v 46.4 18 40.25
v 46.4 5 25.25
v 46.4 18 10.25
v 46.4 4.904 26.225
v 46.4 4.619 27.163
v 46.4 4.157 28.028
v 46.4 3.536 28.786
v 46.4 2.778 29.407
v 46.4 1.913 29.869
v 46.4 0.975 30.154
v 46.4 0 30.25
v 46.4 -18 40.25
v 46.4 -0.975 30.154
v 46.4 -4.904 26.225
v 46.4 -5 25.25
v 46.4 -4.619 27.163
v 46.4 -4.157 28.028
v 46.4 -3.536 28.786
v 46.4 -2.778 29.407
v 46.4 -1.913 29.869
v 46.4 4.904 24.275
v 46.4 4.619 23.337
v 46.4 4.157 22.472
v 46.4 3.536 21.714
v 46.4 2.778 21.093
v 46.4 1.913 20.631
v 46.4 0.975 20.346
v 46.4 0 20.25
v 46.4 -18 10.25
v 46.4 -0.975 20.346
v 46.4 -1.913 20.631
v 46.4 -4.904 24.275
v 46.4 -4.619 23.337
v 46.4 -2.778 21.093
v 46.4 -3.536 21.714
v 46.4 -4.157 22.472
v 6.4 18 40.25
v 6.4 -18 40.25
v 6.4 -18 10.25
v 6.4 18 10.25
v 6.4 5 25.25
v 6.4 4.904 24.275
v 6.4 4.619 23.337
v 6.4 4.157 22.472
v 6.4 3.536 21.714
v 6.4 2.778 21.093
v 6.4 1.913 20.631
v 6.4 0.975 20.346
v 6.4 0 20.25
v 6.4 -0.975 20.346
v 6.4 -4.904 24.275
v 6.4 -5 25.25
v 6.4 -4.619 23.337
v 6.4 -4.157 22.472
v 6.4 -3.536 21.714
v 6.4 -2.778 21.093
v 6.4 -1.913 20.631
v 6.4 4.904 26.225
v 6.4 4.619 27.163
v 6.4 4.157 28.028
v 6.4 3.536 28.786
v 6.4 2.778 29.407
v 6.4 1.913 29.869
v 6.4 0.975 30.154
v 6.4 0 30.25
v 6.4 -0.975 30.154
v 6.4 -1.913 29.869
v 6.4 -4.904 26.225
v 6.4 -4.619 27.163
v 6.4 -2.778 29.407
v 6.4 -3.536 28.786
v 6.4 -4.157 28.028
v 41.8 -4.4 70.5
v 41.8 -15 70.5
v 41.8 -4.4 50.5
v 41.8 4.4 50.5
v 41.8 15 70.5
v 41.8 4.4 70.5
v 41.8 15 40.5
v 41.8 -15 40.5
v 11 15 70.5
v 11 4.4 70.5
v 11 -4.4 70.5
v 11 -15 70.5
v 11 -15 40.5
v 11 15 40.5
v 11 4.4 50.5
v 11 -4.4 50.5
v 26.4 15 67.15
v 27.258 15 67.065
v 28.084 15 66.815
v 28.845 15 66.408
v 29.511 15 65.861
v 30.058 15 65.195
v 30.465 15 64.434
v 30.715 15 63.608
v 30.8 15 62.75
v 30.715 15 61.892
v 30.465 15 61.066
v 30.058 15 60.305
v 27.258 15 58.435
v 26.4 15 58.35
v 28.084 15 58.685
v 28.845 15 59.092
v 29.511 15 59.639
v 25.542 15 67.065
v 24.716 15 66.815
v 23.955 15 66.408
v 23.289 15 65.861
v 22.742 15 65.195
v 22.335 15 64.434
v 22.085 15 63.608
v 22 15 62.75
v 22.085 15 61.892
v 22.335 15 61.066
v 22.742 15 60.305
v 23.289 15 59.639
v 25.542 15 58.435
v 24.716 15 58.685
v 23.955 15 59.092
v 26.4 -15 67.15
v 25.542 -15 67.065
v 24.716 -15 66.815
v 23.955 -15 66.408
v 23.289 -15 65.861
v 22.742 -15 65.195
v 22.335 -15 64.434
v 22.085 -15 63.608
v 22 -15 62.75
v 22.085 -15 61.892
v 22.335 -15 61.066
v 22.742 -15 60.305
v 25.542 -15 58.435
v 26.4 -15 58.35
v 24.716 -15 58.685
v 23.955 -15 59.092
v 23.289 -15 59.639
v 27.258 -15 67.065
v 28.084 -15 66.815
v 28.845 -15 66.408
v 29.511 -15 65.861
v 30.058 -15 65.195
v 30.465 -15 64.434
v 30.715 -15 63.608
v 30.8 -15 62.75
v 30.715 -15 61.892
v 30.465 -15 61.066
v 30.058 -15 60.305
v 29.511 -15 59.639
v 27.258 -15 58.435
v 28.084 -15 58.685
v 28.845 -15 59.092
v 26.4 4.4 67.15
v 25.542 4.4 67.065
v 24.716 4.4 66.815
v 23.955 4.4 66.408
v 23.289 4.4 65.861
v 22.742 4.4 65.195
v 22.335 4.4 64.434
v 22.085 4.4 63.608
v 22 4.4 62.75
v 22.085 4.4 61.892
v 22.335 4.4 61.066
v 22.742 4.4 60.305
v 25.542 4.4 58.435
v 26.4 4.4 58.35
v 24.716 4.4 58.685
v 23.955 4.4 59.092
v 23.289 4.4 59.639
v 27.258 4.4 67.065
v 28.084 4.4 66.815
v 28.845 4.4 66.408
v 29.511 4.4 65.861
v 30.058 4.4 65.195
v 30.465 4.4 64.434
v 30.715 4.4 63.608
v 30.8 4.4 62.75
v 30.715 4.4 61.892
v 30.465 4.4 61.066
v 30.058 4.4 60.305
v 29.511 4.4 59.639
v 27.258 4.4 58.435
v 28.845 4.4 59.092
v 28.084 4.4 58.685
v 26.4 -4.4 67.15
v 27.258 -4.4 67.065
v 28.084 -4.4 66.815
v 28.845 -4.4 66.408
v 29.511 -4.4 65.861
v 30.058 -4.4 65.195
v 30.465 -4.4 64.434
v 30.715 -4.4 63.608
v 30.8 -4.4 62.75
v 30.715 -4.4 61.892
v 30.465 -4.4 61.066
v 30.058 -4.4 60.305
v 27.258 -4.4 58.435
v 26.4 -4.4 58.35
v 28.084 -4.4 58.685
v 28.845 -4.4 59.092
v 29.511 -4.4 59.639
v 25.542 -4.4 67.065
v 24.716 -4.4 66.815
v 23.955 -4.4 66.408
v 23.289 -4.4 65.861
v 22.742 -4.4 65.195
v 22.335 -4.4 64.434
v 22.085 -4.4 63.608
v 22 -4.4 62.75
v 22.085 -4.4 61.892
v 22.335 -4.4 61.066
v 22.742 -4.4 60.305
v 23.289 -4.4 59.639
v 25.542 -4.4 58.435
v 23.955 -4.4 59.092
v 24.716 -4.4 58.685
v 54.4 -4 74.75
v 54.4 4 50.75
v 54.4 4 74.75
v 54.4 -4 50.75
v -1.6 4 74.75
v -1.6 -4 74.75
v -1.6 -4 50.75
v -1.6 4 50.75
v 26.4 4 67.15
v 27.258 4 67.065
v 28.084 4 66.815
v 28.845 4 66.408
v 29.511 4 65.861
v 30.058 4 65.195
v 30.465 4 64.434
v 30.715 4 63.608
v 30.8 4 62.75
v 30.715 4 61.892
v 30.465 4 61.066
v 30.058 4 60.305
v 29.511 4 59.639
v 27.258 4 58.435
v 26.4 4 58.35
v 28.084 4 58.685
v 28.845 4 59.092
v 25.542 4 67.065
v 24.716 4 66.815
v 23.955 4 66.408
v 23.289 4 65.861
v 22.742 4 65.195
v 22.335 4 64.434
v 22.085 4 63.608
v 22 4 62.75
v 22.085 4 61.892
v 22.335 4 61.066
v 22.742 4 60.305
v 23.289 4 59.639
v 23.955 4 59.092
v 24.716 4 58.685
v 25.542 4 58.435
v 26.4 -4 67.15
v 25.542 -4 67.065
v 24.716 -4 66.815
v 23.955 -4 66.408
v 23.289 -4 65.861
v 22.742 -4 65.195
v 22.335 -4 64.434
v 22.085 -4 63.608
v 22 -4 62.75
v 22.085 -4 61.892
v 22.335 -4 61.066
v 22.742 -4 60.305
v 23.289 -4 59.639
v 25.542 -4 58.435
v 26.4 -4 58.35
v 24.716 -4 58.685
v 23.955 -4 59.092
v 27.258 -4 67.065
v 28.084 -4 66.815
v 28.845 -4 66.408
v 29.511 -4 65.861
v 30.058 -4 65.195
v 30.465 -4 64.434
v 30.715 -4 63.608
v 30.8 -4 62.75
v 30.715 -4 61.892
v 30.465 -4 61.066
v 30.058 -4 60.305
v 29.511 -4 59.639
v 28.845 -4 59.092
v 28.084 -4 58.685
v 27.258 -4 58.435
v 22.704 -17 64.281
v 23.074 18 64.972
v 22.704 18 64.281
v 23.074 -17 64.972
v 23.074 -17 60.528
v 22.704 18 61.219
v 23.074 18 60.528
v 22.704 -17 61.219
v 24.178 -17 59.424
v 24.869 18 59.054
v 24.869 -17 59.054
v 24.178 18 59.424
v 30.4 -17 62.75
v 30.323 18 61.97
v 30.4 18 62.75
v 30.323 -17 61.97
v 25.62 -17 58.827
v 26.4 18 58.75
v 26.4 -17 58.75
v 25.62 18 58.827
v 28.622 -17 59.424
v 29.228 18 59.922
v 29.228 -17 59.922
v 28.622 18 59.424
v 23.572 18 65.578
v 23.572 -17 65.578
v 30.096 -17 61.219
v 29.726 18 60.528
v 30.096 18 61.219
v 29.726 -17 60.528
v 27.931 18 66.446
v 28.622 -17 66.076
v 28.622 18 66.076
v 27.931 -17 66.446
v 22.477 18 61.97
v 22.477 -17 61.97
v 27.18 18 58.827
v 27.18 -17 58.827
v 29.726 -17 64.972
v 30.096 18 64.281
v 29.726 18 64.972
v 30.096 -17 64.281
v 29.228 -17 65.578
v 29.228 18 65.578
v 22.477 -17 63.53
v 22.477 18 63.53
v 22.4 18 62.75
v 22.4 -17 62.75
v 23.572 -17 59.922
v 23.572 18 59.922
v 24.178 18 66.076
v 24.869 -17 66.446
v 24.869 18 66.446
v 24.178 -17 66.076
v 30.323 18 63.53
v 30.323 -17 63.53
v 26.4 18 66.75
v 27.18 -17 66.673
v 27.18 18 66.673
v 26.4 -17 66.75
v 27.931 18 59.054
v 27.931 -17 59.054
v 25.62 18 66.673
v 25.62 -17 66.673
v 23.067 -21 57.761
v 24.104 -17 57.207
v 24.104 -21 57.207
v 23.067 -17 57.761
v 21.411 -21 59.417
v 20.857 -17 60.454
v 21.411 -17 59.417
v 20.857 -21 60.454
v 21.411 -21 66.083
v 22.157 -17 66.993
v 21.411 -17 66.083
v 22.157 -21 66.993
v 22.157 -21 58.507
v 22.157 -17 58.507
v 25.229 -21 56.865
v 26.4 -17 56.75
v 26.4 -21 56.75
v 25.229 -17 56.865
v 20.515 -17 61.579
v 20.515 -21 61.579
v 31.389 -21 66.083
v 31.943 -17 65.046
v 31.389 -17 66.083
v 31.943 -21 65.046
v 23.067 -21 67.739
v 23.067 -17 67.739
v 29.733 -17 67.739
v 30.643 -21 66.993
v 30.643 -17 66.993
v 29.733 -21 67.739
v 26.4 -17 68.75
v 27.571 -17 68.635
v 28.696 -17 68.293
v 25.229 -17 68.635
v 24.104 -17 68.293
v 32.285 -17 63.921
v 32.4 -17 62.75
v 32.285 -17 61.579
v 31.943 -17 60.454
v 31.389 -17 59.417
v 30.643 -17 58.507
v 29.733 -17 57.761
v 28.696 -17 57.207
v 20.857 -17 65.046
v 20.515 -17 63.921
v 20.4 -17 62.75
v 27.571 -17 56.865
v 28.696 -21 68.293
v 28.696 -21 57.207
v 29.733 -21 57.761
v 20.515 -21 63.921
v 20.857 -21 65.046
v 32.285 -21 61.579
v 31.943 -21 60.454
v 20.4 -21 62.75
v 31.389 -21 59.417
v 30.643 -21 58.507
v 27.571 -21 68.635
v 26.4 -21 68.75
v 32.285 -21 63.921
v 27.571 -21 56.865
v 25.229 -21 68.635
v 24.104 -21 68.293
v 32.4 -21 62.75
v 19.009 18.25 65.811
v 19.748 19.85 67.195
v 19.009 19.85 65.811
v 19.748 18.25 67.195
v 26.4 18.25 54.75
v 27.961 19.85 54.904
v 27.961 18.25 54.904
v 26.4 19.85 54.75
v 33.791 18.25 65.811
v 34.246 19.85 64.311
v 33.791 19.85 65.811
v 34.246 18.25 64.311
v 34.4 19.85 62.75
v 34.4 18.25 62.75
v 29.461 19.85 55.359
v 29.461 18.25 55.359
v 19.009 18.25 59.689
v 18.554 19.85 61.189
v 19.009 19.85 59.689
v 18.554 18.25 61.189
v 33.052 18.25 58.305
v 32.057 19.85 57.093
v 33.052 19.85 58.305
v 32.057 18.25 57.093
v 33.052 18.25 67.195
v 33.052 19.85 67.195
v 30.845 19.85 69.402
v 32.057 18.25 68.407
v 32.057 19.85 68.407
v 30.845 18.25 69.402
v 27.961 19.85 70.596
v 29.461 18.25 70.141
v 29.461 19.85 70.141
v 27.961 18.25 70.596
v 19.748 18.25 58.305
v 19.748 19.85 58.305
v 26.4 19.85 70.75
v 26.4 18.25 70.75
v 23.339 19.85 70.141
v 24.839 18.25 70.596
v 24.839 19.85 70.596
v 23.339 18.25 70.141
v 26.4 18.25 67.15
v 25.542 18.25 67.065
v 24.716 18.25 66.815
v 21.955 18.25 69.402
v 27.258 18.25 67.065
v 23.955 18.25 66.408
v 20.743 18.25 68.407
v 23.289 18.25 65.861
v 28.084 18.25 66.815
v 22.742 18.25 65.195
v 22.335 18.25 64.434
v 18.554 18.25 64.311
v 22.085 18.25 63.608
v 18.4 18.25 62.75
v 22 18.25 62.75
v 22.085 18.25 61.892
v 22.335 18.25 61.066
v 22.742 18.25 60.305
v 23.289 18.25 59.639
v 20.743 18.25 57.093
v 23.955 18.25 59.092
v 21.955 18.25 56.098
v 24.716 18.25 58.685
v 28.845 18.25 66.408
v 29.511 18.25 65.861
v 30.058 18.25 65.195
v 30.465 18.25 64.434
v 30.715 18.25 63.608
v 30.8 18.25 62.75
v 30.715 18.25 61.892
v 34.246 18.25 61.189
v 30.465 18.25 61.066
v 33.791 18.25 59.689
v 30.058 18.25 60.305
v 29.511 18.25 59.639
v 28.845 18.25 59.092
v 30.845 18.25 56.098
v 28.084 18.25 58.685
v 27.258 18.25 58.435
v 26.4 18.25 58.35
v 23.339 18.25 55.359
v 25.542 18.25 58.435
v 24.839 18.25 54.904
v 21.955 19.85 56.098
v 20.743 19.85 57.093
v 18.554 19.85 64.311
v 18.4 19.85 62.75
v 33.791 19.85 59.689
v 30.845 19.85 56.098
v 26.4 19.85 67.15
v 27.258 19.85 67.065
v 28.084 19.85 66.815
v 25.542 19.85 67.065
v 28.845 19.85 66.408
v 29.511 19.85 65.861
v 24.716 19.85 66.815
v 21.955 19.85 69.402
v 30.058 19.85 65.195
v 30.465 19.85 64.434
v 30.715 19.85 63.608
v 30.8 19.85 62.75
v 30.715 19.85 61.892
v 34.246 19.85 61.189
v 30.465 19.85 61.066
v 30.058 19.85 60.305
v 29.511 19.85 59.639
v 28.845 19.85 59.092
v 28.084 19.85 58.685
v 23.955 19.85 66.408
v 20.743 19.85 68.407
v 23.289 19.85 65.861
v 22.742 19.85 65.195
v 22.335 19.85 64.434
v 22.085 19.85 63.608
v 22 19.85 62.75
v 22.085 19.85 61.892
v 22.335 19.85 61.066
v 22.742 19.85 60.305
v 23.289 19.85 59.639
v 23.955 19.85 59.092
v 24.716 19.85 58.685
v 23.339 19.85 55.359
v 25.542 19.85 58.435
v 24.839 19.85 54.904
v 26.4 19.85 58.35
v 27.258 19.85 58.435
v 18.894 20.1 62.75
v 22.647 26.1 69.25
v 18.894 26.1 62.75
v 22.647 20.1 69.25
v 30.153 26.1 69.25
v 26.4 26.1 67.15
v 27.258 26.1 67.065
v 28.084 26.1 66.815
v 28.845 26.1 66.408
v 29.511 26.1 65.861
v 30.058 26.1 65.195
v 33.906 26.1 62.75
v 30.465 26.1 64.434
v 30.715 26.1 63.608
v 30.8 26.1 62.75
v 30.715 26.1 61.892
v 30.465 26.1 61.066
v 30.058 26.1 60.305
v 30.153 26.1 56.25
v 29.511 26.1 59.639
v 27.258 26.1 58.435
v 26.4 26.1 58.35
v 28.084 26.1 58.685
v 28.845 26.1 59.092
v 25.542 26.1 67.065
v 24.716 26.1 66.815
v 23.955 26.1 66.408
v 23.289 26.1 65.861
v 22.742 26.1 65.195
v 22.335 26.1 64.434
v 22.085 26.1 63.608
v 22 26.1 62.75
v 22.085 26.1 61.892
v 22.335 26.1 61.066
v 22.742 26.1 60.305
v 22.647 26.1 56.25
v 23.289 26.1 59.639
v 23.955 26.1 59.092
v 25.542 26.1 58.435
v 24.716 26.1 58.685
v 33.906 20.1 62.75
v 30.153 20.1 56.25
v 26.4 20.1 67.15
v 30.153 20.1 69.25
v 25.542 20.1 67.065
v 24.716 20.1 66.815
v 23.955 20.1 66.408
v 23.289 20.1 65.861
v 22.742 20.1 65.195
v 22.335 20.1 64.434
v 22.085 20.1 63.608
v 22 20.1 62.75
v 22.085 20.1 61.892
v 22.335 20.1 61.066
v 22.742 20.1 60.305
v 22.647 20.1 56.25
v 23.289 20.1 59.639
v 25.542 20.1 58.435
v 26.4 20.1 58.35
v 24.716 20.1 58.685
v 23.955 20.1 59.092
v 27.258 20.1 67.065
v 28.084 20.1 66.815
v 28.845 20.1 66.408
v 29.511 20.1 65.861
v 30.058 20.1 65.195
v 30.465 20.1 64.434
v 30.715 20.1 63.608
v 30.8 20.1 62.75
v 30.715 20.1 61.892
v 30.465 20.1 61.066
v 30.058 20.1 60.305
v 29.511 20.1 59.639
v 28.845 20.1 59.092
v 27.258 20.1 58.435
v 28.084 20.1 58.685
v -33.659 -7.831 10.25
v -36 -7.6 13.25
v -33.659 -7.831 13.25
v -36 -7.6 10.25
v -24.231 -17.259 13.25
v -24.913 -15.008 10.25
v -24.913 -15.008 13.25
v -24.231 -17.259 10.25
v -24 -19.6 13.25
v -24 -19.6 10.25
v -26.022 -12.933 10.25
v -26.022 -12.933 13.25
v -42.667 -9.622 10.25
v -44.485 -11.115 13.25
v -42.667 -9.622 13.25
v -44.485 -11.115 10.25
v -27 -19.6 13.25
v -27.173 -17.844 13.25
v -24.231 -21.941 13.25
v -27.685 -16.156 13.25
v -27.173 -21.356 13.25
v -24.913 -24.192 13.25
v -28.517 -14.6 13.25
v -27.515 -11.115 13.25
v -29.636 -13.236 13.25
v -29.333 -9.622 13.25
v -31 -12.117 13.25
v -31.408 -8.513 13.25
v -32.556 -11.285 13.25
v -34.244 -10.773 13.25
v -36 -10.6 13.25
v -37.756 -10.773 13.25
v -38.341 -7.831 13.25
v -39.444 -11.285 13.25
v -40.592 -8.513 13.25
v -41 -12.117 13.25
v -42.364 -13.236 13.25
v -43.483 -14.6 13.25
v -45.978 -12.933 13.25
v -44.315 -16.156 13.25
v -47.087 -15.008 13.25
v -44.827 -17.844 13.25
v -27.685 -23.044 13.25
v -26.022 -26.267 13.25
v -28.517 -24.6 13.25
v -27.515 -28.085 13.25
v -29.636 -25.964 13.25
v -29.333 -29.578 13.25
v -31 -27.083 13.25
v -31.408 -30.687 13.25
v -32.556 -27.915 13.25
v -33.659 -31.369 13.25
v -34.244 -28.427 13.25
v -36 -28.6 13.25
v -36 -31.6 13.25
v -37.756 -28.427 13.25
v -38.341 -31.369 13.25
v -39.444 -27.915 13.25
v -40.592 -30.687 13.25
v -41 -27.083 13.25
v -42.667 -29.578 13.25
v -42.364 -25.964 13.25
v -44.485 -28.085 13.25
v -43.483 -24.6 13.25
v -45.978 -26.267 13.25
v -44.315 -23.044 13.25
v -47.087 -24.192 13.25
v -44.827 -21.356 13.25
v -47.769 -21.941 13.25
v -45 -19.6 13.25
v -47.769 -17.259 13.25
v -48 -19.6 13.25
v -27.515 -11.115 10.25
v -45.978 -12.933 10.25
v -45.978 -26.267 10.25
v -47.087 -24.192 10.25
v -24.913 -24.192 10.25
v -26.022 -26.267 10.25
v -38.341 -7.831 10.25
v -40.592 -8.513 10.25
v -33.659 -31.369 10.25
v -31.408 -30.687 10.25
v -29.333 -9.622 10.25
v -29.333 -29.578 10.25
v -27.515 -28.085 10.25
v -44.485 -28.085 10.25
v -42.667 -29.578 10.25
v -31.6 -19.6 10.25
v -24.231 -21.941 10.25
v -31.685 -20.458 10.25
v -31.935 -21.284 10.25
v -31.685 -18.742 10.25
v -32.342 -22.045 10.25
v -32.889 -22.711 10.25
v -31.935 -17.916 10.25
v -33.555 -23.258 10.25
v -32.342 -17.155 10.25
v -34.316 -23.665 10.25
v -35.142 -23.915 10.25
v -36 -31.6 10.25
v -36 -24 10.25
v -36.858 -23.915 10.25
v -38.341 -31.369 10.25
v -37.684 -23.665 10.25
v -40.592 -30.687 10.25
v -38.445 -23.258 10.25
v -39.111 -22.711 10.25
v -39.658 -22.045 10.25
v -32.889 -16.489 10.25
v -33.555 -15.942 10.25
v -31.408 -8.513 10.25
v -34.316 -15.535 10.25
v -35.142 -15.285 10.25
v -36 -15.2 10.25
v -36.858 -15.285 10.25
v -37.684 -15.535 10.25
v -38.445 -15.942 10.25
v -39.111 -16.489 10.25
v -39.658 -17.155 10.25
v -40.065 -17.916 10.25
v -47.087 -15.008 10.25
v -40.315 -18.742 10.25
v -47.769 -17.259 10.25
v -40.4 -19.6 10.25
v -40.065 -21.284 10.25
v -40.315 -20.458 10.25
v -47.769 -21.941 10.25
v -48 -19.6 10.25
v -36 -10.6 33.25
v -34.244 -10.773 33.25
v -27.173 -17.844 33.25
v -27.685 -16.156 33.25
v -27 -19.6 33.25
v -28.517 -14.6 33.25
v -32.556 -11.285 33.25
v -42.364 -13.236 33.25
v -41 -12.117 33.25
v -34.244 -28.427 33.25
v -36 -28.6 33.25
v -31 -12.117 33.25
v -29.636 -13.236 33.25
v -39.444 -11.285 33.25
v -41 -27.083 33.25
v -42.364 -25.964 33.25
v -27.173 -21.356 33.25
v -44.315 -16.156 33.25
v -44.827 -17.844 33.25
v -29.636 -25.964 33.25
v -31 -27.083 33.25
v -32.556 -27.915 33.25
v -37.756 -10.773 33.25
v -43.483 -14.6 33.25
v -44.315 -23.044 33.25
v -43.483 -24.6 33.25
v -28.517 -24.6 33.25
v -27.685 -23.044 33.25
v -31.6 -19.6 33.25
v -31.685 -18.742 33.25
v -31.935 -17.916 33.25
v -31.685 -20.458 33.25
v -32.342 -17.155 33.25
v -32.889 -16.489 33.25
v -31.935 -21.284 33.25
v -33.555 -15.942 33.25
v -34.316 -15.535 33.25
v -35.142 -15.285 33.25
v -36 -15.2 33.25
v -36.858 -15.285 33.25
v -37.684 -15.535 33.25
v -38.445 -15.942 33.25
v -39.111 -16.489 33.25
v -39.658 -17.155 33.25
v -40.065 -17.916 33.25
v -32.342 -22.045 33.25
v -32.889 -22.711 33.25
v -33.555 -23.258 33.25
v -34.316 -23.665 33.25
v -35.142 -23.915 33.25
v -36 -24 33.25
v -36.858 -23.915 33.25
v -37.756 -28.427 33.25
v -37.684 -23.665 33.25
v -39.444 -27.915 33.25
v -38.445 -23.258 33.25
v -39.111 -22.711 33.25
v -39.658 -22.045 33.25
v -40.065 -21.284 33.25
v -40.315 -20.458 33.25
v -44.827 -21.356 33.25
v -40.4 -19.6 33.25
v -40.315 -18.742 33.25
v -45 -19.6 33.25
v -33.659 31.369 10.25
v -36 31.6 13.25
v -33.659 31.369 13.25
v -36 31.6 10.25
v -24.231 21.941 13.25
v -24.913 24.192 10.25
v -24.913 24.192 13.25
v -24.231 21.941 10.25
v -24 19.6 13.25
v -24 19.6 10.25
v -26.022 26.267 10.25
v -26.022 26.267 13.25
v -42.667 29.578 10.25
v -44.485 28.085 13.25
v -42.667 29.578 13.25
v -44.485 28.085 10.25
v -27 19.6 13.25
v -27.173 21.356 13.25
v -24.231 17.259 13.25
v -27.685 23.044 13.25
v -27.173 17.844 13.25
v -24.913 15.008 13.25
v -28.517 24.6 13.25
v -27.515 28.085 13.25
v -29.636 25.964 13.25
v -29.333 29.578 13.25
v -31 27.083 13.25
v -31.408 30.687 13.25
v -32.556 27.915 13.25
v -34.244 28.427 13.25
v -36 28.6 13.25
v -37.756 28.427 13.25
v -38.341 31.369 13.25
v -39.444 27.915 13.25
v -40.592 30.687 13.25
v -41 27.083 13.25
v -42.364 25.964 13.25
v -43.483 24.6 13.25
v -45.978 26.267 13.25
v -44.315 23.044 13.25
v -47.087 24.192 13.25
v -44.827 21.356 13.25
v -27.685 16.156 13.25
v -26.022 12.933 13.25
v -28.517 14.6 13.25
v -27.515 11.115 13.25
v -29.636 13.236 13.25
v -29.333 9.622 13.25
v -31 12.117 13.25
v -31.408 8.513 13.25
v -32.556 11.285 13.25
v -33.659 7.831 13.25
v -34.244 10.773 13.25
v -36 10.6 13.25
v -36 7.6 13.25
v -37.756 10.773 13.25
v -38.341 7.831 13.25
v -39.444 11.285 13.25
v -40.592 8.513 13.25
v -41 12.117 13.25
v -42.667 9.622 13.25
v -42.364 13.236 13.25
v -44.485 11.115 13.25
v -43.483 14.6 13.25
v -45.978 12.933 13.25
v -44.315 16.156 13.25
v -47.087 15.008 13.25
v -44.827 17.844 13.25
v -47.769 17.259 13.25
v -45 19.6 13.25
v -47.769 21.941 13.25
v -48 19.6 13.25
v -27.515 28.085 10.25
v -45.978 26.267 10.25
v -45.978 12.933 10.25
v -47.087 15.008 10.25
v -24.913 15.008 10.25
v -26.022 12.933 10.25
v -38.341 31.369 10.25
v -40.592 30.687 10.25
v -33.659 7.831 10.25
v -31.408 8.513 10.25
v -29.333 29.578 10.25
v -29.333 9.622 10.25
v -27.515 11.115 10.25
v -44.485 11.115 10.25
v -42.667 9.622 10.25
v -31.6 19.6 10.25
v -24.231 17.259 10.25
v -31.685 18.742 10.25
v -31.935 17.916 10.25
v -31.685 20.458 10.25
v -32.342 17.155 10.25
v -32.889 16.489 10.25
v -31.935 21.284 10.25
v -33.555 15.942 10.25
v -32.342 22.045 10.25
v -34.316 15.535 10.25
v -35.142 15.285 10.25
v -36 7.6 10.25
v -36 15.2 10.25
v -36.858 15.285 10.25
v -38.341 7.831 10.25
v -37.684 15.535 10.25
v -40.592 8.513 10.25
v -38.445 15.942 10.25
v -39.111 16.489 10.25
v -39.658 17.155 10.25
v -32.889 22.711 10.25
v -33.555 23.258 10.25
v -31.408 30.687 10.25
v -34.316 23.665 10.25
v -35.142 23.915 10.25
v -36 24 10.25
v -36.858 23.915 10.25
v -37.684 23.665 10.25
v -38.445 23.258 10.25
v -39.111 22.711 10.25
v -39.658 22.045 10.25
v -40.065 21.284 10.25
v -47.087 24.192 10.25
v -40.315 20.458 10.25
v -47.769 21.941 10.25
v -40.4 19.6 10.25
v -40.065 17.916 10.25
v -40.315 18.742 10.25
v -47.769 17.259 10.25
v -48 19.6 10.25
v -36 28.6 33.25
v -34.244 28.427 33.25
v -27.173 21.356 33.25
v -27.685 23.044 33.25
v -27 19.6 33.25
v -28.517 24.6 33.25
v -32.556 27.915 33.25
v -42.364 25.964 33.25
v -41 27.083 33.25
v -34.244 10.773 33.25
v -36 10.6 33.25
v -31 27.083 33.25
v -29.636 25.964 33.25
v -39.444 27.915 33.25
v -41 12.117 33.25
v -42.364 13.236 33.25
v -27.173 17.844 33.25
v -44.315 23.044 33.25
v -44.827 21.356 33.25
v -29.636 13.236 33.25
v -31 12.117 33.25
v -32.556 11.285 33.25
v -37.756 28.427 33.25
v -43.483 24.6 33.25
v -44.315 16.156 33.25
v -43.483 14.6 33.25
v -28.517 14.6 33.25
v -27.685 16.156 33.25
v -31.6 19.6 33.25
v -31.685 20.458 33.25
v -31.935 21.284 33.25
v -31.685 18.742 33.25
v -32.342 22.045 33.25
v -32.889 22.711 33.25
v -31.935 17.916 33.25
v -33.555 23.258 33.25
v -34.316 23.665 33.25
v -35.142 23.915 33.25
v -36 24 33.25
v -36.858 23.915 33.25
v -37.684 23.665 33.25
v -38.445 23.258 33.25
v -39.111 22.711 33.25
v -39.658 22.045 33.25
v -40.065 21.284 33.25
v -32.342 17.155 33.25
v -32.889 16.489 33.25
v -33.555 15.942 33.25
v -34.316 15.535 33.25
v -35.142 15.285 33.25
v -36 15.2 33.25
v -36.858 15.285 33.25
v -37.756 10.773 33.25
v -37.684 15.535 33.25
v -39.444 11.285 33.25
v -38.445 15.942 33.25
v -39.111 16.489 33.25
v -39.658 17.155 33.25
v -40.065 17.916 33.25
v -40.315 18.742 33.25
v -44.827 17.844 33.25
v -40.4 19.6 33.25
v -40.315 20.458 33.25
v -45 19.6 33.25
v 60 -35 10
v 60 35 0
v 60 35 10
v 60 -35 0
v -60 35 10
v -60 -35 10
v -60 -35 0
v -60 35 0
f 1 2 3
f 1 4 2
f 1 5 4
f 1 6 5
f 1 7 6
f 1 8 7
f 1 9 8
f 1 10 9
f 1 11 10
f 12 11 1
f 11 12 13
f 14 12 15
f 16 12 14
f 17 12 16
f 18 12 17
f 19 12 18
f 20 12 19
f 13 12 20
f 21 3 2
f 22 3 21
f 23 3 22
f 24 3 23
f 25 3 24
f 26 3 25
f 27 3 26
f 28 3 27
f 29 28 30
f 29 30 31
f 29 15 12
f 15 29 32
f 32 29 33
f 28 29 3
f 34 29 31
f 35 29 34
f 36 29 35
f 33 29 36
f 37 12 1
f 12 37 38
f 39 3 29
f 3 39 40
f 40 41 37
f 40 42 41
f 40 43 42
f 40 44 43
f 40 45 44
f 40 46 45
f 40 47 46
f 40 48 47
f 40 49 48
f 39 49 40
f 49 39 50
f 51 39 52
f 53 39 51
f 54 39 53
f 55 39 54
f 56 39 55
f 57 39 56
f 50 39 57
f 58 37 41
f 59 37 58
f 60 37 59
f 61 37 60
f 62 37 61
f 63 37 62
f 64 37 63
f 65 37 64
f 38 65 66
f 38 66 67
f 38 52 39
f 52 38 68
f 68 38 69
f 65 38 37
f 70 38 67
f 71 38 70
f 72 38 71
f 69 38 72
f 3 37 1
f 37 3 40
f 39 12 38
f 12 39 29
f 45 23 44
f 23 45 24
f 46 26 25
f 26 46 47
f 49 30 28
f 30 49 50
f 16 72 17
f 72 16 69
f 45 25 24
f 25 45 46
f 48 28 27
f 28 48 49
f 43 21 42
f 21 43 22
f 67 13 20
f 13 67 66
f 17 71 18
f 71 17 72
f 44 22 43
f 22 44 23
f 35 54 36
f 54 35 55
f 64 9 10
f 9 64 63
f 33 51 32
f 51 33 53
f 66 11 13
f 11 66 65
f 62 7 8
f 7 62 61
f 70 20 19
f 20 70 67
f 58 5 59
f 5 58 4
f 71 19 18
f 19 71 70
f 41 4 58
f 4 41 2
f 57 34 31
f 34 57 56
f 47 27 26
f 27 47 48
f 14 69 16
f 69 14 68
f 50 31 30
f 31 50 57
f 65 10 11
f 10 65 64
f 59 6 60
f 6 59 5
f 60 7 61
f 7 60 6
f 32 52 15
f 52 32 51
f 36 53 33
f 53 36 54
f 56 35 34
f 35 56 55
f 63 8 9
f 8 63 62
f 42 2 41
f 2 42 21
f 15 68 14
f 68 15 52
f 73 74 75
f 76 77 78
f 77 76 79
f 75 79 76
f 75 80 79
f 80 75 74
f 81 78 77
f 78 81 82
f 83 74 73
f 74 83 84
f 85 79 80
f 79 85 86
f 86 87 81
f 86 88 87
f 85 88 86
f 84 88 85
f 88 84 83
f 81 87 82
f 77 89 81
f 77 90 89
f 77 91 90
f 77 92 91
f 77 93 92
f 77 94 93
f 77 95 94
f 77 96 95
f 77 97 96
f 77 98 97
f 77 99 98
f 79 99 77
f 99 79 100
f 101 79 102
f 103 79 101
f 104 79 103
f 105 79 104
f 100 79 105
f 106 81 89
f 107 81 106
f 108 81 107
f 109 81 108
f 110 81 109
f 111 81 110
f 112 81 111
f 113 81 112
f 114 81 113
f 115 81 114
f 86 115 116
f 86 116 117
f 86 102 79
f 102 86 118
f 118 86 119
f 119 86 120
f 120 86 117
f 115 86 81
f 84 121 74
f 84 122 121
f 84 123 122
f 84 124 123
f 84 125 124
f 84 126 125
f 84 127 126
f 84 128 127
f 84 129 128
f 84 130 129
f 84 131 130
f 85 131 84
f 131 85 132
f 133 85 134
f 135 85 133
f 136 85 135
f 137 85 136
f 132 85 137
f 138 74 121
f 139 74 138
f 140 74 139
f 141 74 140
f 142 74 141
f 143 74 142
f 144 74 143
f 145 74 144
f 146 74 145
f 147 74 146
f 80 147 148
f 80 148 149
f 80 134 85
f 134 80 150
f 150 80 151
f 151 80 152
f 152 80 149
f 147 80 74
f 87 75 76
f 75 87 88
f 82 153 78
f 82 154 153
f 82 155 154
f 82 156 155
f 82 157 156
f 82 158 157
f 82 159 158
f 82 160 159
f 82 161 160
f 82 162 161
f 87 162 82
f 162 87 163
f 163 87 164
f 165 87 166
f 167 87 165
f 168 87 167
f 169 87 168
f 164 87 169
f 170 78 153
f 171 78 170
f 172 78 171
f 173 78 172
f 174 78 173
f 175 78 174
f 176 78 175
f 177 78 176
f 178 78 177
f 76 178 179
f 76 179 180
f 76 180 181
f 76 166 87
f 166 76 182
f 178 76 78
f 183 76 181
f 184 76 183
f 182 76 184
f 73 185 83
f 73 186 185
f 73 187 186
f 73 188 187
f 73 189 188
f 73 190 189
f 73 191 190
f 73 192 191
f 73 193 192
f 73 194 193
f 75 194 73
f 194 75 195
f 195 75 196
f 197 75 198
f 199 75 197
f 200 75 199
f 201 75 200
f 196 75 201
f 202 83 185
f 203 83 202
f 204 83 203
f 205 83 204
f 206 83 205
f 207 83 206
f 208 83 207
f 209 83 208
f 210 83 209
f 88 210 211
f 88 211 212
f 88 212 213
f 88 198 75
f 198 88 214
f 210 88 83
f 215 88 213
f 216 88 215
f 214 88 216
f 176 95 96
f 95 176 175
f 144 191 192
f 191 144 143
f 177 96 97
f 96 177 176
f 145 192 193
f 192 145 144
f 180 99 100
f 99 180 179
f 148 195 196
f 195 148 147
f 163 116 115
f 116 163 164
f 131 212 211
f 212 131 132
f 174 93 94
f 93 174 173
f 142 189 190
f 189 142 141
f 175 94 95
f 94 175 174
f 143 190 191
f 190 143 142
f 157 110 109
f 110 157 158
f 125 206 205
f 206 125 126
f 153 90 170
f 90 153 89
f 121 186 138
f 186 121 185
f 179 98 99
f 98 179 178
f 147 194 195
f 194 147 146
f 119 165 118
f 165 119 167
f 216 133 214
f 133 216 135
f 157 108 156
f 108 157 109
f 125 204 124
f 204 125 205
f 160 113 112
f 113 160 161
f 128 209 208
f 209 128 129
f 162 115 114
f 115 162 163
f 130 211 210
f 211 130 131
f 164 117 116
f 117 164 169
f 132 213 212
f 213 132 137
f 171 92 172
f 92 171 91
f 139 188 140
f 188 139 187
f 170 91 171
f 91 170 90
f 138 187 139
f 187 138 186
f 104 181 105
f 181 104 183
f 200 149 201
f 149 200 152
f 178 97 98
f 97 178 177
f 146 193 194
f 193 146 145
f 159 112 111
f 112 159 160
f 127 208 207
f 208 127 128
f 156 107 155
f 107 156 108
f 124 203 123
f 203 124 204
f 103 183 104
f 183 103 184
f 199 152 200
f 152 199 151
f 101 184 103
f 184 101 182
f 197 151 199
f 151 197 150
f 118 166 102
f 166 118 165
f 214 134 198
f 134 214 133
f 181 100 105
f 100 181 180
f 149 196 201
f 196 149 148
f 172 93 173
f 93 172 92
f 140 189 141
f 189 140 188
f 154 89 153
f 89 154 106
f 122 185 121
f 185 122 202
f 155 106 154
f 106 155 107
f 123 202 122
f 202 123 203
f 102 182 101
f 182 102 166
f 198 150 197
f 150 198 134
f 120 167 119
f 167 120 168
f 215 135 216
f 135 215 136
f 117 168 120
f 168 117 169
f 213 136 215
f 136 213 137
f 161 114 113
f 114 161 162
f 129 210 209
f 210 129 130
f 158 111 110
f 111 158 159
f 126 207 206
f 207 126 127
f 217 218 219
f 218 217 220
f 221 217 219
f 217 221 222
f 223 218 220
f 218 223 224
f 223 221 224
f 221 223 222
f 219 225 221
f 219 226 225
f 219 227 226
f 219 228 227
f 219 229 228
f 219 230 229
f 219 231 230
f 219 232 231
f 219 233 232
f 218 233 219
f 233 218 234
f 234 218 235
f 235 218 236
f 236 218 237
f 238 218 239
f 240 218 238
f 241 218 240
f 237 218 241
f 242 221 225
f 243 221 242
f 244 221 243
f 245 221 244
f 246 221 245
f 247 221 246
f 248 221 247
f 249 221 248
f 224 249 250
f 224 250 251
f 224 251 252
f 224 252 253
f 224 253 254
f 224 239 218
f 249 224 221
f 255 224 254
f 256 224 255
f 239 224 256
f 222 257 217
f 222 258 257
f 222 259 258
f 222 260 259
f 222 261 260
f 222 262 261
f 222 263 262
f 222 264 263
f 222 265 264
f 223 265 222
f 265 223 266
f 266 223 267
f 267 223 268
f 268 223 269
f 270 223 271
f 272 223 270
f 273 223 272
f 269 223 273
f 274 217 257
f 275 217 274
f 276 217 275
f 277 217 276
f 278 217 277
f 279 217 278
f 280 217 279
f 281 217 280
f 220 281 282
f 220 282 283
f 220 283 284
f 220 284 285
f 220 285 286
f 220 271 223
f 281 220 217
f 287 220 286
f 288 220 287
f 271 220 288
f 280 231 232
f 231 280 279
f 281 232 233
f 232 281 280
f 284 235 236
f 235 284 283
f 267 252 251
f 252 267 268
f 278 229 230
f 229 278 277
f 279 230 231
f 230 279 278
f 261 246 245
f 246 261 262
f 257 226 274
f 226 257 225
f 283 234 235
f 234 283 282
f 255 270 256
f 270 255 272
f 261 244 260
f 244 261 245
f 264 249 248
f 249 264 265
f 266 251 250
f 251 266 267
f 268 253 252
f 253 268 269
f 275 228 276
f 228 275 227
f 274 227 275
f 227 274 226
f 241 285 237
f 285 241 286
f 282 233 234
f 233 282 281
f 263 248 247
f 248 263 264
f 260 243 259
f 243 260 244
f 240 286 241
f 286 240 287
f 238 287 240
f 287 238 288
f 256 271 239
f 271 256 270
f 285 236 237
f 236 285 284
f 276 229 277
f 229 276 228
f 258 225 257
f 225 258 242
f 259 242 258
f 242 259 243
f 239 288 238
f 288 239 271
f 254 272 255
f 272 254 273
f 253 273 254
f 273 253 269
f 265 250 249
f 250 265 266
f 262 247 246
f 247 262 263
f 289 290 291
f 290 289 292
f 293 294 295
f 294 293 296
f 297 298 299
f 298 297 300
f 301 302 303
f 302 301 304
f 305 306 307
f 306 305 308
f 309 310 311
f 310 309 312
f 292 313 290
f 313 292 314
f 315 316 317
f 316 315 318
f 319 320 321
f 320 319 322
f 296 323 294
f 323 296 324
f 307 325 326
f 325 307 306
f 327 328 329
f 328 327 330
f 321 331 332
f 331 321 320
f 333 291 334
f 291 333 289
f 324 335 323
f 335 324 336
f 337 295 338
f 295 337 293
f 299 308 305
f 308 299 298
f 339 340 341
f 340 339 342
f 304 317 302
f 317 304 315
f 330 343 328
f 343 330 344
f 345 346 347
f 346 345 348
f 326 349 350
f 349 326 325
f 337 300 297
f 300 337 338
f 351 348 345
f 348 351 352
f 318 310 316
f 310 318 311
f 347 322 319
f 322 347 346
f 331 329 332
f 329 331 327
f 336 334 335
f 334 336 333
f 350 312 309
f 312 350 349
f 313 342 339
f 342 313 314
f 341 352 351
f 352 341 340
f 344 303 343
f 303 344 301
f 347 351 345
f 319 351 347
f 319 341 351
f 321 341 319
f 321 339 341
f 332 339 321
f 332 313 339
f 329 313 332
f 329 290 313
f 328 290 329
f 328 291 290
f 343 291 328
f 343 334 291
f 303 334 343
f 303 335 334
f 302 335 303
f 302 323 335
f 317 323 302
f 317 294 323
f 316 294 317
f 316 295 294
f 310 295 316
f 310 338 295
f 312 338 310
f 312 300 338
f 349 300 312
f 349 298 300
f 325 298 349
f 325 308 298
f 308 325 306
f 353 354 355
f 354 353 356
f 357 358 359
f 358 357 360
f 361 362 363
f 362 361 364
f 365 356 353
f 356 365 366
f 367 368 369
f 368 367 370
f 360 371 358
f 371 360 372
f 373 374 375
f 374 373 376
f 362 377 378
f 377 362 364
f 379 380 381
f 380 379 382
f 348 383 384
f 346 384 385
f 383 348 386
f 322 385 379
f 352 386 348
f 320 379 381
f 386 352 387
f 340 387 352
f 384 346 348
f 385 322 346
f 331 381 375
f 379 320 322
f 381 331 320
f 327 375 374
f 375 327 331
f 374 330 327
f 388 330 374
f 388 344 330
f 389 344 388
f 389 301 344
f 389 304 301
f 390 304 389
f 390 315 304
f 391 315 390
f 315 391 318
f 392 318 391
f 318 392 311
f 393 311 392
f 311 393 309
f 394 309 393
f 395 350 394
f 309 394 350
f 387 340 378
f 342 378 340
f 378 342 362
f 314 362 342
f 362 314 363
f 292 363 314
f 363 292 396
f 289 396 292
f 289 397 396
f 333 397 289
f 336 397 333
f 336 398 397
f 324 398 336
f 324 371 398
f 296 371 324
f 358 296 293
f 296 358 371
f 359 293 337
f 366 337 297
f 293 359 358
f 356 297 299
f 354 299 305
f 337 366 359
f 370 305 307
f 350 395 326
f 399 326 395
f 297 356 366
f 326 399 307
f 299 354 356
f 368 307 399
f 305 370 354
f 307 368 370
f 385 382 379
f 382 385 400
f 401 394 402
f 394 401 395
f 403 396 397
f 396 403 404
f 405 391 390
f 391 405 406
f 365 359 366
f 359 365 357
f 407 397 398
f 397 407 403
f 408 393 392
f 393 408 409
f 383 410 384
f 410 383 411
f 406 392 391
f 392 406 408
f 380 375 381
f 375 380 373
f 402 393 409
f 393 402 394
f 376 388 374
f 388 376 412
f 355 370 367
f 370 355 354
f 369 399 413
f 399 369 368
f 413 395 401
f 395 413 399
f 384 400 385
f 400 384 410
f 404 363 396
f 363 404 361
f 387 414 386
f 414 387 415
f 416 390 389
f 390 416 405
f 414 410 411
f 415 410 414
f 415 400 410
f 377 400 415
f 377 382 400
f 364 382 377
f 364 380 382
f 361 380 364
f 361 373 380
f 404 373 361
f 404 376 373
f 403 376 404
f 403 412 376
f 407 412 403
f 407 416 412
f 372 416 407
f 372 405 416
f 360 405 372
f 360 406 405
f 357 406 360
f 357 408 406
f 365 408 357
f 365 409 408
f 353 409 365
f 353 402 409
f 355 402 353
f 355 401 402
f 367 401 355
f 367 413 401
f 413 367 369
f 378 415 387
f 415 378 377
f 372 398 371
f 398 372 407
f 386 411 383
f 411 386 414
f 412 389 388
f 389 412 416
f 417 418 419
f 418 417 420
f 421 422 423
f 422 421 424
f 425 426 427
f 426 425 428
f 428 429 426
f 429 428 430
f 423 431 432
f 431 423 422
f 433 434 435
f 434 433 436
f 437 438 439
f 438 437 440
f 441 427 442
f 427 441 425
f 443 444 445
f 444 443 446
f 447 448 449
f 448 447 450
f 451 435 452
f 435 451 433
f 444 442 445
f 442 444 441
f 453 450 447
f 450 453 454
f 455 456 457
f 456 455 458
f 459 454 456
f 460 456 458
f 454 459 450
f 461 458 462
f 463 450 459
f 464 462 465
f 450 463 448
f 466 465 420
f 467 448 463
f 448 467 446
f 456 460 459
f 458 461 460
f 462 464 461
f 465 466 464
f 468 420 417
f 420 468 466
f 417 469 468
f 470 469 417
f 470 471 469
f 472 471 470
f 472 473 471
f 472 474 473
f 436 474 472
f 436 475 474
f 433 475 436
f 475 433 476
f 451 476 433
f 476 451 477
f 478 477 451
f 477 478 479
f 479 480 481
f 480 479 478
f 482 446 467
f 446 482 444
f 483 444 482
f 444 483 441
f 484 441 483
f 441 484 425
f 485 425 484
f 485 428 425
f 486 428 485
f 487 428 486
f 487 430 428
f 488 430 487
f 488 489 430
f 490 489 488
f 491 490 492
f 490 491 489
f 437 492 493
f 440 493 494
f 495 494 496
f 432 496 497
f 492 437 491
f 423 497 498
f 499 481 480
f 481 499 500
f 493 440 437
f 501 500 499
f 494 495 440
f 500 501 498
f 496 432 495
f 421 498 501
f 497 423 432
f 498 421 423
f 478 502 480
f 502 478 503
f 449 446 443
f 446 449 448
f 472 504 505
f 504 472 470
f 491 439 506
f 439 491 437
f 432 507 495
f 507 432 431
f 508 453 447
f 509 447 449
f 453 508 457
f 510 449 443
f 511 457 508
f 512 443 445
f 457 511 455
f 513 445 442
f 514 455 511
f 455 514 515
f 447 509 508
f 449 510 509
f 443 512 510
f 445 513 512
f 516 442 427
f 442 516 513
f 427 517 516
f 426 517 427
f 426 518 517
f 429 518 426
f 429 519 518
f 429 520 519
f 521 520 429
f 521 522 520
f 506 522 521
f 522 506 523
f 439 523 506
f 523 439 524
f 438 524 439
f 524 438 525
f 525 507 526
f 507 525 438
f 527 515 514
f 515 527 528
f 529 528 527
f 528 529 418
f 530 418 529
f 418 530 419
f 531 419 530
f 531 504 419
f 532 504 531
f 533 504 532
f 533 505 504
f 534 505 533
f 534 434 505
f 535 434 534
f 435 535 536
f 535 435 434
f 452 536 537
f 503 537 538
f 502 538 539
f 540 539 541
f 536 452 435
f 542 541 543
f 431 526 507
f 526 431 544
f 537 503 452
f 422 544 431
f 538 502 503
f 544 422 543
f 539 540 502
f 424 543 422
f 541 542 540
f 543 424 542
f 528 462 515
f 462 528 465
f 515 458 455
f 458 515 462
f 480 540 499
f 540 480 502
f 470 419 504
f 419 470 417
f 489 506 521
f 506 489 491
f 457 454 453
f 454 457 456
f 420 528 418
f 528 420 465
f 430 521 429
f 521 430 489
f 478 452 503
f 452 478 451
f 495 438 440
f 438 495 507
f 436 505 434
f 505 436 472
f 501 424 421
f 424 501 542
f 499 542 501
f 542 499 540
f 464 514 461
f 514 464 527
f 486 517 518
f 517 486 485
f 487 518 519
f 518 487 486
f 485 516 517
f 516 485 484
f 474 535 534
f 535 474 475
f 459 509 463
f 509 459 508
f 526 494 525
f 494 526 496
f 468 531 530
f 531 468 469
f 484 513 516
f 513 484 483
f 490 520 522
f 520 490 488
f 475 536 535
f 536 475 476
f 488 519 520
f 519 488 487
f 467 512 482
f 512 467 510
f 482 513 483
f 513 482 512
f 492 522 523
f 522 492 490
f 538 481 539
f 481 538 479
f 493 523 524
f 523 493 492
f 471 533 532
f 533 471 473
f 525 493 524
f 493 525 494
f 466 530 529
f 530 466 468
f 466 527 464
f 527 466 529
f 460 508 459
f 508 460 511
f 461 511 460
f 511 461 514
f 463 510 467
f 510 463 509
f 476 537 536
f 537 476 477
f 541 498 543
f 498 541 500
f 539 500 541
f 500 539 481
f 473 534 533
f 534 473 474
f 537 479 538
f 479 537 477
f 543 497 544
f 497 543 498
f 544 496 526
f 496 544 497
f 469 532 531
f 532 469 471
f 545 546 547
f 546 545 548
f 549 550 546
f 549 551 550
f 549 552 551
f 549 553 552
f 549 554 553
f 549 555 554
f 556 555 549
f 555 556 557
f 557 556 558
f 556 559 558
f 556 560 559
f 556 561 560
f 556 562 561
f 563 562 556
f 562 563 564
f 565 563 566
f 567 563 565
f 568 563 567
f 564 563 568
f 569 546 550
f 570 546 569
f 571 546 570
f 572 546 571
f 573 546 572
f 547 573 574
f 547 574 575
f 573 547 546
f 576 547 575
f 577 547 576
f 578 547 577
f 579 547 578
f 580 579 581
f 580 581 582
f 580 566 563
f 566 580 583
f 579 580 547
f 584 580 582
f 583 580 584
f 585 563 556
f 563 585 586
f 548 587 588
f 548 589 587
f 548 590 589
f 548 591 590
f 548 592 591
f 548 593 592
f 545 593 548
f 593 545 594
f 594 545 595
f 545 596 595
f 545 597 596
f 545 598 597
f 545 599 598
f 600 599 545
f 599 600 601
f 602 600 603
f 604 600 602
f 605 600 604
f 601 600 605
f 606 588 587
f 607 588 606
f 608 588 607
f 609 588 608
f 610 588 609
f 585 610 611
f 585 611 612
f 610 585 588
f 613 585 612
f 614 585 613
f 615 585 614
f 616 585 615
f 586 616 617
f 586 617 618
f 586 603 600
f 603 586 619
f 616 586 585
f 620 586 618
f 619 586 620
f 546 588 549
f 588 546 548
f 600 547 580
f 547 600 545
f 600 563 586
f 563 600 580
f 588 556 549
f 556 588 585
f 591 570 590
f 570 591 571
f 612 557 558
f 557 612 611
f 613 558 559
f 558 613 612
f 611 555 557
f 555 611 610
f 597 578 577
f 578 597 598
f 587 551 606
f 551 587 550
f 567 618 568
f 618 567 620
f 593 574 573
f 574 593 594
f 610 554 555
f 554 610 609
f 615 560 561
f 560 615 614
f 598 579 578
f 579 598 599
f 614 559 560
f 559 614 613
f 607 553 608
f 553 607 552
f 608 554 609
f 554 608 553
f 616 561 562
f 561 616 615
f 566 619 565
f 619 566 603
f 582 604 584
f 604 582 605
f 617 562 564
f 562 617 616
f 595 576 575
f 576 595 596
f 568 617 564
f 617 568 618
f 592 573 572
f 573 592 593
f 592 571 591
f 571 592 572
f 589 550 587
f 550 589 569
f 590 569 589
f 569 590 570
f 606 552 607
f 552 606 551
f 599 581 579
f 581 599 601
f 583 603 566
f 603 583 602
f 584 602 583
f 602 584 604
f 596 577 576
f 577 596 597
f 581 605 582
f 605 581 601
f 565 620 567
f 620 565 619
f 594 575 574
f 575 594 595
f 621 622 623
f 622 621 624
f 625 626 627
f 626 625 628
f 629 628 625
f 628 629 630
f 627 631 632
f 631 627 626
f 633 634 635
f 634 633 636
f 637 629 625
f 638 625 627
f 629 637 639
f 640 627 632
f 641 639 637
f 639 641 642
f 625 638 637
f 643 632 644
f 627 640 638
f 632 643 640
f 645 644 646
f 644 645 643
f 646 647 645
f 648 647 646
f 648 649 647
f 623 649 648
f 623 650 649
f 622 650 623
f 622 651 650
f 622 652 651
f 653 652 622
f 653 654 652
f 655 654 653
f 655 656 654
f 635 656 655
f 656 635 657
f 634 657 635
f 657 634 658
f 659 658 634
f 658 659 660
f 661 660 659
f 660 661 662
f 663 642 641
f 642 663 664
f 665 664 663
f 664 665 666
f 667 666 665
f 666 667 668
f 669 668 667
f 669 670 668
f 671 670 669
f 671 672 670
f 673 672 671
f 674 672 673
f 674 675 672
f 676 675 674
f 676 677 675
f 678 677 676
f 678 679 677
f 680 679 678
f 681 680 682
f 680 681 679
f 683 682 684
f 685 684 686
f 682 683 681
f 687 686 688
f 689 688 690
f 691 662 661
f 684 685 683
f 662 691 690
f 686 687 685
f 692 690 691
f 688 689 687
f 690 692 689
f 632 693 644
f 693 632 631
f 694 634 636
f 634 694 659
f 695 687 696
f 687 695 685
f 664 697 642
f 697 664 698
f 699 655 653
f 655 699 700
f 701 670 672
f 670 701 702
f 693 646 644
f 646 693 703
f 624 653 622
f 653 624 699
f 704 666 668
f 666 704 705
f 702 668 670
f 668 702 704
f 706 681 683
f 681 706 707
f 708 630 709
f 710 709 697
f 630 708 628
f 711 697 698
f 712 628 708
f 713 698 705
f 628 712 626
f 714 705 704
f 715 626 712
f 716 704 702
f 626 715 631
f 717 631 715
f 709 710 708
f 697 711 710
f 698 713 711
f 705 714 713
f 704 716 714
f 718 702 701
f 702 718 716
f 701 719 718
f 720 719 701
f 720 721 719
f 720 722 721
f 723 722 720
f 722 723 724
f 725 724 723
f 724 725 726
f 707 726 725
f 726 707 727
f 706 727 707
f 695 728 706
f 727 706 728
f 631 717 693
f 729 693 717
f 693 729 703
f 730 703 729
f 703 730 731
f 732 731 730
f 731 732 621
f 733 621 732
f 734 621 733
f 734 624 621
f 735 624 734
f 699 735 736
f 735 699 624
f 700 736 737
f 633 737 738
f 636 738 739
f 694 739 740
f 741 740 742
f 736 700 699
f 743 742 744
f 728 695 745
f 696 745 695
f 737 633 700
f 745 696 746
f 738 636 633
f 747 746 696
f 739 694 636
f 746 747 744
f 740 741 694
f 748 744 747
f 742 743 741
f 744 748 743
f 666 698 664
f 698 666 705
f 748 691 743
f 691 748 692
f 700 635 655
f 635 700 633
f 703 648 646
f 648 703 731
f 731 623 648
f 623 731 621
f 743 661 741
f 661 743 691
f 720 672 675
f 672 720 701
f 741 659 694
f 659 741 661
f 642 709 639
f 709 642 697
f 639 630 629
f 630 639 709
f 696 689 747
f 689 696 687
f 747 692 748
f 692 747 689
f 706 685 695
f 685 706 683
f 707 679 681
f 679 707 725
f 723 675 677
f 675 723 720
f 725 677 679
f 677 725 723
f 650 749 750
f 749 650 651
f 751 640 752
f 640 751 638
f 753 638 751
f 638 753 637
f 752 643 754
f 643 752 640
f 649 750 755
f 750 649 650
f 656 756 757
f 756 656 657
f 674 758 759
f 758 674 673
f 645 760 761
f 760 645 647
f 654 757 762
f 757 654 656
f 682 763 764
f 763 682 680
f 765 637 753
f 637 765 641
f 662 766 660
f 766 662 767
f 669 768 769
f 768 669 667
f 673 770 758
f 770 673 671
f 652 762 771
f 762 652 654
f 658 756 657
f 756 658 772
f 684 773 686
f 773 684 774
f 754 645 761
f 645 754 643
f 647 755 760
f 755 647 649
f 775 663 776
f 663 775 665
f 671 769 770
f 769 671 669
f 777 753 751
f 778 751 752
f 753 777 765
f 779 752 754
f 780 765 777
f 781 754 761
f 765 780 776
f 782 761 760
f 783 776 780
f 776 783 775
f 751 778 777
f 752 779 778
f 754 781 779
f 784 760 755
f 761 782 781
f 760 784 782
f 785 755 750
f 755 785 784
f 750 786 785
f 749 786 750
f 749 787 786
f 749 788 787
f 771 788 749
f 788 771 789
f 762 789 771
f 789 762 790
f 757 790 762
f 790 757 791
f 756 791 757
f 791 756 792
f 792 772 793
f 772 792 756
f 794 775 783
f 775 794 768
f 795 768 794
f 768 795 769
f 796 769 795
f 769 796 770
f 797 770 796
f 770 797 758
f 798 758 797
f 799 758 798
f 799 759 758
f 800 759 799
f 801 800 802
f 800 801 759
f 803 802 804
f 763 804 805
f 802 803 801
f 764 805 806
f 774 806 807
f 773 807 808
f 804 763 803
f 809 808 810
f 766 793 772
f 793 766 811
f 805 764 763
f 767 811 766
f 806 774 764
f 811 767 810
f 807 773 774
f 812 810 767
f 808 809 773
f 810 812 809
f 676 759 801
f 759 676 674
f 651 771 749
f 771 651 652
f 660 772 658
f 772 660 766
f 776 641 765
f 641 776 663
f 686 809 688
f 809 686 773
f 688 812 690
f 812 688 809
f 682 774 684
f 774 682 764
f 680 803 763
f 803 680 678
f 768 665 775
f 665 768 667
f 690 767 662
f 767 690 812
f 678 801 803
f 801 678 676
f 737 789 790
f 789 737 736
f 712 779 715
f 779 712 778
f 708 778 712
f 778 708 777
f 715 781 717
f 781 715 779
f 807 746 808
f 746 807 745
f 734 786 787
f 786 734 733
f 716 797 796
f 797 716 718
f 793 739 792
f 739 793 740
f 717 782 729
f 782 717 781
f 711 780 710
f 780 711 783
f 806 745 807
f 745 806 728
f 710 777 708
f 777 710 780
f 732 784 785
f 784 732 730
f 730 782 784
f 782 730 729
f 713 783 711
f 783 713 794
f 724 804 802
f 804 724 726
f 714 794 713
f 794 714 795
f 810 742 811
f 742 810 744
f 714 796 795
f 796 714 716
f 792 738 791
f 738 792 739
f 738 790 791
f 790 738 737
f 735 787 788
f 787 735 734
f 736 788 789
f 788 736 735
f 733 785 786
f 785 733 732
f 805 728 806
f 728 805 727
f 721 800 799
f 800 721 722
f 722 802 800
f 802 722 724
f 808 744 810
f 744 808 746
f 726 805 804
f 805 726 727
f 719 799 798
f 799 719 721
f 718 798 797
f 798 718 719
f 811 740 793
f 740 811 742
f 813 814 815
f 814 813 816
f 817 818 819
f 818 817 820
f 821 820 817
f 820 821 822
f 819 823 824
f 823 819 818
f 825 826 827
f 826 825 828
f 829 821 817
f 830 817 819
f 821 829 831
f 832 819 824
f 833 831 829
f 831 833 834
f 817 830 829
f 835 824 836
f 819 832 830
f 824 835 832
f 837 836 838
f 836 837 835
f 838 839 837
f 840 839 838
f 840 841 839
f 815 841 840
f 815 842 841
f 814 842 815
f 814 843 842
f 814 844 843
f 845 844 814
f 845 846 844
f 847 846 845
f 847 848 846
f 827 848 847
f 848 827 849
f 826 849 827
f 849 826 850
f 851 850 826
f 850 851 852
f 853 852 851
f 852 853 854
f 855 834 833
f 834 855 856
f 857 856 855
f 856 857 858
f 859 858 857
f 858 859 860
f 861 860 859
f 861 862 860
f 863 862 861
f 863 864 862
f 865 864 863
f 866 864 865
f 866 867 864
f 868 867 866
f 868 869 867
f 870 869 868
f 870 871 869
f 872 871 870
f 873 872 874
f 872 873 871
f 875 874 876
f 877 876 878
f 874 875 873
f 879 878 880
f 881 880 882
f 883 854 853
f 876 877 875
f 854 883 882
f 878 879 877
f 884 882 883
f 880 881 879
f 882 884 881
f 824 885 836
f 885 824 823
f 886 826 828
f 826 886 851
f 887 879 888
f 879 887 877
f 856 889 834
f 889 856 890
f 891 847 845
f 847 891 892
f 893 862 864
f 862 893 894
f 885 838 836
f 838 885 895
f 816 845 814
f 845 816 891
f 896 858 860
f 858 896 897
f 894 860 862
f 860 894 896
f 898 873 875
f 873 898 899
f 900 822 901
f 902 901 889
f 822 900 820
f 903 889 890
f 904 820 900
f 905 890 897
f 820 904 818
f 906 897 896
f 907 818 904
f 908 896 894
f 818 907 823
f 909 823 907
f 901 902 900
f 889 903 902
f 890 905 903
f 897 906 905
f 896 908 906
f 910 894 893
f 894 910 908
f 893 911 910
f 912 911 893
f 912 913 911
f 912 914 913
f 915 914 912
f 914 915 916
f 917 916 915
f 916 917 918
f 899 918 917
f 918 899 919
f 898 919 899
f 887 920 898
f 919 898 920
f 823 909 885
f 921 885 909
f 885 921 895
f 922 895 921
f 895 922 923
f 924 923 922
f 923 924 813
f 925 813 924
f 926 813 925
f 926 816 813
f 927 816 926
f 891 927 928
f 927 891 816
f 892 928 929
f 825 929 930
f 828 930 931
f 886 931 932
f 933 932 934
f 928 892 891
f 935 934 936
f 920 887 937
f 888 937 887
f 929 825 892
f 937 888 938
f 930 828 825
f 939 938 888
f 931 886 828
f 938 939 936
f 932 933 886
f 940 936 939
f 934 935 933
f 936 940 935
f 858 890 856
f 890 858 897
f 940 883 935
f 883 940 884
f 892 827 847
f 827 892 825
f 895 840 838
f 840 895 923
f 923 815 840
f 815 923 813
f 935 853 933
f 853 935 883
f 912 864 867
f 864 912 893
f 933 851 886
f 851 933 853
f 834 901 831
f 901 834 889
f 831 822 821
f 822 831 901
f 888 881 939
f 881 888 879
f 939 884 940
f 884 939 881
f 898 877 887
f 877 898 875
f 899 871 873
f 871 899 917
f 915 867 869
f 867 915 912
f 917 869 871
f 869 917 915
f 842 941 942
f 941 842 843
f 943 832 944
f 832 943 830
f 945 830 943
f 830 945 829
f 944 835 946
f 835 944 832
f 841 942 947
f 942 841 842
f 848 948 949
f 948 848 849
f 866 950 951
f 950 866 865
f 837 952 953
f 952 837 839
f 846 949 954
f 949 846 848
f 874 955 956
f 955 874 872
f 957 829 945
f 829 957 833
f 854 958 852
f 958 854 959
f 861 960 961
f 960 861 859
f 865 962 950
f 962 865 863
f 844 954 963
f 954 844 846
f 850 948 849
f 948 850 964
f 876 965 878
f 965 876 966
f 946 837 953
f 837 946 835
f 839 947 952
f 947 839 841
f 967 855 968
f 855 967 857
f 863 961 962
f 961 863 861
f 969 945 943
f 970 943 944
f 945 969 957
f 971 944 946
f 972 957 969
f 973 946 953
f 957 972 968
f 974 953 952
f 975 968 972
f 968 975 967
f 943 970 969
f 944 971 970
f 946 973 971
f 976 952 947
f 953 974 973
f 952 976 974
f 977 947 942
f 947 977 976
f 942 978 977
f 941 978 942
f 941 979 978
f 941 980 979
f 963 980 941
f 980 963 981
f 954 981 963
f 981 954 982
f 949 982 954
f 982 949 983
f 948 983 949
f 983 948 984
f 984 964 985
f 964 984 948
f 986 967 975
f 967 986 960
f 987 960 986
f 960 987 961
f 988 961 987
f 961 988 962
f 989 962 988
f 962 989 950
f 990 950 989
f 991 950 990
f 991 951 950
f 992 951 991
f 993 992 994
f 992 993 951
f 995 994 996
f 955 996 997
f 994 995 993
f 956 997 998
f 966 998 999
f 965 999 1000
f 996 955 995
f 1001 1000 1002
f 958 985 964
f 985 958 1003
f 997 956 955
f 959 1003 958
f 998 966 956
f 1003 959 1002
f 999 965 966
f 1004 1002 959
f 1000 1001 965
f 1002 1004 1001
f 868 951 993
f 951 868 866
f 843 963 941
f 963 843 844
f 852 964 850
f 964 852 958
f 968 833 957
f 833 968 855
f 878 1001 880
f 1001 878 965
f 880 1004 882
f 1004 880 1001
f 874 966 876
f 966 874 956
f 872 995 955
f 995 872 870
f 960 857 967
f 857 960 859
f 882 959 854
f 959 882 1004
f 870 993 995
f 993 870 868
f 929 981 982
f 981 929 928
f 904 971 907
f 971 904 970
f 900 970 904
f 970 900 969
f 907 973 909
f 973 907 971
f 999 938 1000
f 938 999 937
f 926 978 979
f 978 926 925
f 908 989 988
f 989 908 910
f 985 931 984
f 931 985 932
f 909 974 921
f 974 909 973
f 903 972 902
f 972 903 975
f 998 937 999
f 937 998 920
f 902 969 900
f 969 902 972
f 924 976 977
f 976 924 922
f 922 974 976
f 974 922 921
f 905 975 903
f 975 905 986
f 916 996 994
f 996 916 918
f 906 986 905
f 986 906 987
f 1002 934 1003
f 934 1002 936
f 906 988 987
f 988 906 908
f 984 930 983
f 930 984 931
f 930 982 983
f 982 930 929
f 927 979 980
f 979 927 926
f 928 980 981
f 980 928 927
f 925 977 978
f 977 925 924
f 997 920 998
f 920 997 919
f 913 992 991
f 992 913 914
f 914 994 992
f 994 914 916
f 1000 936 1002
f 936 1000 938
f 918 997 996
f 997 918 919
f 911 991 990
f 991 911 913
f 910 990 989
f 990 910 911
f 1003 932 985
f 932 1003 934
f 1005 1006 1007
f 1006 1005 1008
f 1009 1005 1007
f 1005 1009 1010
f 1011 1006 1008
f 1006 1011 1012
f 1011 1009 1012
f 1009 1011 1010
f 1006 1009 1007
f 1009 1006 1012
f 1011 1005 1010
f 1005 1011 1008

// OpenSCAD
$fn = 32;

// ------------------------------------------------------------------------
// Indexing jig: plate 120 x 70 mm, pin d8
// Every part is its own module, assembly() places every instance.
// ------------------------------------------------------------------------

// --- part 1 ---
module jig_plate() {
  difference() {
    translate([-60, -35, 0]) cube([120, 70, 10]);
  }
}

// --- part 2 ---
module locator_block() {
  difference() {
    translate([-20, -18, 0]) cube([40, 36, 30]);
    translate([0, 0, 15]) rotate([0, 90, 0]) cylinder(h = 42, d = 10, center = true);
  }
}

// --- part 3 ---
module index_fork() {
  difference() {
    translate([-15.4, -15, 0]) cube([30.8, 30, 30]);
    translate([-16.4, -4.4, 10]) cube([32.8, 8.8, 21]);
    translate([0, 0, 22.25]) rotate([90, 0, 0]) cylinder(h = 32, d = 8.8, center = true);
  }
}

// --- part 4 ---
module index_arm() {
  difference() {
    translate([-28, -4, 0]) cube([56, 8, 24]);
    translate([0, 0, 12]) rotate([90, 0, 0]) cylinder(h = 10, d = 8.8, center = true);
  }
}

// --- part 5 ---
module index_pin() {
  rotate([0, 90, 0]) cylinder(h = 36, d = 8, center = true);
  translate([-21, 0, 0]) rotate([0, 90, 0]) cylinder(h = 4, d = 12);
}

// --- part 6 ---
module pin_washer() {
  difference() {
      translate([0, 0, 0]) cylinder(h = 1.6, d = 16);
      translate([0, 0, -1]) cylinder(h = 3.6, d = 8.8);
    }
}

// --- part 7 ---
module lock_nut() {
  difference() {
    linear_extrude(height = 6) polygon(points = [[7.506, 0], [3.753, 6.5], [-3.753, 6.5], [-7.506, 0], [-3.753, -6.5], [3.753, -6.5]]);
    translate([0, 0, -1]) cylinder(h = 8, d = 8.8);
  }
}

// --- part 8 ---
module guide_bush_a() {
  difference() {
    union() {
      cylinder(h = 3, d = 24);
      translate([0, 0, 3]) cylinder(h = 20, d = 18);
    }
    translate([0, 0, -1]) cylinder(h = 25, d = 8.8);
  }
}

// --- part 9 ---
module guide_bush_b() {
  difference() {
    union() {
      cylinder(h = 3, d = 24);
      translate([0, 0, 3]) cylinder(h = 20, d = 18);
    }
    translate([0, 0, -1]) cylinder(h = 25, d = 8.8);
  }
}

// --- assembly ---
module assembly() {
  color([0.80, 0.24, 0.20]) translate([0, 0, 0]) rotate([0, 0, 0]) jig_plate();
  color([0.20, 0.45, 0.75]) translate([26.4, 0, 10.25]) rotate([0, 0, 0]) locator_block();
  color([0.25, 0.62, 0.32]) translate([26.4, 0, 40.5]) rotate([0, 0, 0]) index_fork();
  color([0.92, 0.70, 0.18]) translate([26.4, 0, 50.75]) rotate([0, 0, 0]) index_arm();
  color([0.58, 0.35, 0.70]) translate([26.4, 0, 62.75]) rotate([0, 0, 90]) index_pin();
  color([0.16, 0.66, 0.66]) translate([26.4, 19.85, 62.75]) rotate([90, 0, 0]) pin_washer();
  color([0.85, 0.48, 0.18]) translate([26.4, 26.1, 62.75]) rotate([90, 0, 0]) lock_nut();
  color([0.55, 0.60, 0.65]) translate([-36, -19.6, 10.25]) rotate([0, 0, 0]) guide_bush_a();
  color([0.75, 0.30, 0.55]) translate([-36, 19.6, 10.25]) rotate([0, 0, 0]) guide_bush_b();
}

assembly();
